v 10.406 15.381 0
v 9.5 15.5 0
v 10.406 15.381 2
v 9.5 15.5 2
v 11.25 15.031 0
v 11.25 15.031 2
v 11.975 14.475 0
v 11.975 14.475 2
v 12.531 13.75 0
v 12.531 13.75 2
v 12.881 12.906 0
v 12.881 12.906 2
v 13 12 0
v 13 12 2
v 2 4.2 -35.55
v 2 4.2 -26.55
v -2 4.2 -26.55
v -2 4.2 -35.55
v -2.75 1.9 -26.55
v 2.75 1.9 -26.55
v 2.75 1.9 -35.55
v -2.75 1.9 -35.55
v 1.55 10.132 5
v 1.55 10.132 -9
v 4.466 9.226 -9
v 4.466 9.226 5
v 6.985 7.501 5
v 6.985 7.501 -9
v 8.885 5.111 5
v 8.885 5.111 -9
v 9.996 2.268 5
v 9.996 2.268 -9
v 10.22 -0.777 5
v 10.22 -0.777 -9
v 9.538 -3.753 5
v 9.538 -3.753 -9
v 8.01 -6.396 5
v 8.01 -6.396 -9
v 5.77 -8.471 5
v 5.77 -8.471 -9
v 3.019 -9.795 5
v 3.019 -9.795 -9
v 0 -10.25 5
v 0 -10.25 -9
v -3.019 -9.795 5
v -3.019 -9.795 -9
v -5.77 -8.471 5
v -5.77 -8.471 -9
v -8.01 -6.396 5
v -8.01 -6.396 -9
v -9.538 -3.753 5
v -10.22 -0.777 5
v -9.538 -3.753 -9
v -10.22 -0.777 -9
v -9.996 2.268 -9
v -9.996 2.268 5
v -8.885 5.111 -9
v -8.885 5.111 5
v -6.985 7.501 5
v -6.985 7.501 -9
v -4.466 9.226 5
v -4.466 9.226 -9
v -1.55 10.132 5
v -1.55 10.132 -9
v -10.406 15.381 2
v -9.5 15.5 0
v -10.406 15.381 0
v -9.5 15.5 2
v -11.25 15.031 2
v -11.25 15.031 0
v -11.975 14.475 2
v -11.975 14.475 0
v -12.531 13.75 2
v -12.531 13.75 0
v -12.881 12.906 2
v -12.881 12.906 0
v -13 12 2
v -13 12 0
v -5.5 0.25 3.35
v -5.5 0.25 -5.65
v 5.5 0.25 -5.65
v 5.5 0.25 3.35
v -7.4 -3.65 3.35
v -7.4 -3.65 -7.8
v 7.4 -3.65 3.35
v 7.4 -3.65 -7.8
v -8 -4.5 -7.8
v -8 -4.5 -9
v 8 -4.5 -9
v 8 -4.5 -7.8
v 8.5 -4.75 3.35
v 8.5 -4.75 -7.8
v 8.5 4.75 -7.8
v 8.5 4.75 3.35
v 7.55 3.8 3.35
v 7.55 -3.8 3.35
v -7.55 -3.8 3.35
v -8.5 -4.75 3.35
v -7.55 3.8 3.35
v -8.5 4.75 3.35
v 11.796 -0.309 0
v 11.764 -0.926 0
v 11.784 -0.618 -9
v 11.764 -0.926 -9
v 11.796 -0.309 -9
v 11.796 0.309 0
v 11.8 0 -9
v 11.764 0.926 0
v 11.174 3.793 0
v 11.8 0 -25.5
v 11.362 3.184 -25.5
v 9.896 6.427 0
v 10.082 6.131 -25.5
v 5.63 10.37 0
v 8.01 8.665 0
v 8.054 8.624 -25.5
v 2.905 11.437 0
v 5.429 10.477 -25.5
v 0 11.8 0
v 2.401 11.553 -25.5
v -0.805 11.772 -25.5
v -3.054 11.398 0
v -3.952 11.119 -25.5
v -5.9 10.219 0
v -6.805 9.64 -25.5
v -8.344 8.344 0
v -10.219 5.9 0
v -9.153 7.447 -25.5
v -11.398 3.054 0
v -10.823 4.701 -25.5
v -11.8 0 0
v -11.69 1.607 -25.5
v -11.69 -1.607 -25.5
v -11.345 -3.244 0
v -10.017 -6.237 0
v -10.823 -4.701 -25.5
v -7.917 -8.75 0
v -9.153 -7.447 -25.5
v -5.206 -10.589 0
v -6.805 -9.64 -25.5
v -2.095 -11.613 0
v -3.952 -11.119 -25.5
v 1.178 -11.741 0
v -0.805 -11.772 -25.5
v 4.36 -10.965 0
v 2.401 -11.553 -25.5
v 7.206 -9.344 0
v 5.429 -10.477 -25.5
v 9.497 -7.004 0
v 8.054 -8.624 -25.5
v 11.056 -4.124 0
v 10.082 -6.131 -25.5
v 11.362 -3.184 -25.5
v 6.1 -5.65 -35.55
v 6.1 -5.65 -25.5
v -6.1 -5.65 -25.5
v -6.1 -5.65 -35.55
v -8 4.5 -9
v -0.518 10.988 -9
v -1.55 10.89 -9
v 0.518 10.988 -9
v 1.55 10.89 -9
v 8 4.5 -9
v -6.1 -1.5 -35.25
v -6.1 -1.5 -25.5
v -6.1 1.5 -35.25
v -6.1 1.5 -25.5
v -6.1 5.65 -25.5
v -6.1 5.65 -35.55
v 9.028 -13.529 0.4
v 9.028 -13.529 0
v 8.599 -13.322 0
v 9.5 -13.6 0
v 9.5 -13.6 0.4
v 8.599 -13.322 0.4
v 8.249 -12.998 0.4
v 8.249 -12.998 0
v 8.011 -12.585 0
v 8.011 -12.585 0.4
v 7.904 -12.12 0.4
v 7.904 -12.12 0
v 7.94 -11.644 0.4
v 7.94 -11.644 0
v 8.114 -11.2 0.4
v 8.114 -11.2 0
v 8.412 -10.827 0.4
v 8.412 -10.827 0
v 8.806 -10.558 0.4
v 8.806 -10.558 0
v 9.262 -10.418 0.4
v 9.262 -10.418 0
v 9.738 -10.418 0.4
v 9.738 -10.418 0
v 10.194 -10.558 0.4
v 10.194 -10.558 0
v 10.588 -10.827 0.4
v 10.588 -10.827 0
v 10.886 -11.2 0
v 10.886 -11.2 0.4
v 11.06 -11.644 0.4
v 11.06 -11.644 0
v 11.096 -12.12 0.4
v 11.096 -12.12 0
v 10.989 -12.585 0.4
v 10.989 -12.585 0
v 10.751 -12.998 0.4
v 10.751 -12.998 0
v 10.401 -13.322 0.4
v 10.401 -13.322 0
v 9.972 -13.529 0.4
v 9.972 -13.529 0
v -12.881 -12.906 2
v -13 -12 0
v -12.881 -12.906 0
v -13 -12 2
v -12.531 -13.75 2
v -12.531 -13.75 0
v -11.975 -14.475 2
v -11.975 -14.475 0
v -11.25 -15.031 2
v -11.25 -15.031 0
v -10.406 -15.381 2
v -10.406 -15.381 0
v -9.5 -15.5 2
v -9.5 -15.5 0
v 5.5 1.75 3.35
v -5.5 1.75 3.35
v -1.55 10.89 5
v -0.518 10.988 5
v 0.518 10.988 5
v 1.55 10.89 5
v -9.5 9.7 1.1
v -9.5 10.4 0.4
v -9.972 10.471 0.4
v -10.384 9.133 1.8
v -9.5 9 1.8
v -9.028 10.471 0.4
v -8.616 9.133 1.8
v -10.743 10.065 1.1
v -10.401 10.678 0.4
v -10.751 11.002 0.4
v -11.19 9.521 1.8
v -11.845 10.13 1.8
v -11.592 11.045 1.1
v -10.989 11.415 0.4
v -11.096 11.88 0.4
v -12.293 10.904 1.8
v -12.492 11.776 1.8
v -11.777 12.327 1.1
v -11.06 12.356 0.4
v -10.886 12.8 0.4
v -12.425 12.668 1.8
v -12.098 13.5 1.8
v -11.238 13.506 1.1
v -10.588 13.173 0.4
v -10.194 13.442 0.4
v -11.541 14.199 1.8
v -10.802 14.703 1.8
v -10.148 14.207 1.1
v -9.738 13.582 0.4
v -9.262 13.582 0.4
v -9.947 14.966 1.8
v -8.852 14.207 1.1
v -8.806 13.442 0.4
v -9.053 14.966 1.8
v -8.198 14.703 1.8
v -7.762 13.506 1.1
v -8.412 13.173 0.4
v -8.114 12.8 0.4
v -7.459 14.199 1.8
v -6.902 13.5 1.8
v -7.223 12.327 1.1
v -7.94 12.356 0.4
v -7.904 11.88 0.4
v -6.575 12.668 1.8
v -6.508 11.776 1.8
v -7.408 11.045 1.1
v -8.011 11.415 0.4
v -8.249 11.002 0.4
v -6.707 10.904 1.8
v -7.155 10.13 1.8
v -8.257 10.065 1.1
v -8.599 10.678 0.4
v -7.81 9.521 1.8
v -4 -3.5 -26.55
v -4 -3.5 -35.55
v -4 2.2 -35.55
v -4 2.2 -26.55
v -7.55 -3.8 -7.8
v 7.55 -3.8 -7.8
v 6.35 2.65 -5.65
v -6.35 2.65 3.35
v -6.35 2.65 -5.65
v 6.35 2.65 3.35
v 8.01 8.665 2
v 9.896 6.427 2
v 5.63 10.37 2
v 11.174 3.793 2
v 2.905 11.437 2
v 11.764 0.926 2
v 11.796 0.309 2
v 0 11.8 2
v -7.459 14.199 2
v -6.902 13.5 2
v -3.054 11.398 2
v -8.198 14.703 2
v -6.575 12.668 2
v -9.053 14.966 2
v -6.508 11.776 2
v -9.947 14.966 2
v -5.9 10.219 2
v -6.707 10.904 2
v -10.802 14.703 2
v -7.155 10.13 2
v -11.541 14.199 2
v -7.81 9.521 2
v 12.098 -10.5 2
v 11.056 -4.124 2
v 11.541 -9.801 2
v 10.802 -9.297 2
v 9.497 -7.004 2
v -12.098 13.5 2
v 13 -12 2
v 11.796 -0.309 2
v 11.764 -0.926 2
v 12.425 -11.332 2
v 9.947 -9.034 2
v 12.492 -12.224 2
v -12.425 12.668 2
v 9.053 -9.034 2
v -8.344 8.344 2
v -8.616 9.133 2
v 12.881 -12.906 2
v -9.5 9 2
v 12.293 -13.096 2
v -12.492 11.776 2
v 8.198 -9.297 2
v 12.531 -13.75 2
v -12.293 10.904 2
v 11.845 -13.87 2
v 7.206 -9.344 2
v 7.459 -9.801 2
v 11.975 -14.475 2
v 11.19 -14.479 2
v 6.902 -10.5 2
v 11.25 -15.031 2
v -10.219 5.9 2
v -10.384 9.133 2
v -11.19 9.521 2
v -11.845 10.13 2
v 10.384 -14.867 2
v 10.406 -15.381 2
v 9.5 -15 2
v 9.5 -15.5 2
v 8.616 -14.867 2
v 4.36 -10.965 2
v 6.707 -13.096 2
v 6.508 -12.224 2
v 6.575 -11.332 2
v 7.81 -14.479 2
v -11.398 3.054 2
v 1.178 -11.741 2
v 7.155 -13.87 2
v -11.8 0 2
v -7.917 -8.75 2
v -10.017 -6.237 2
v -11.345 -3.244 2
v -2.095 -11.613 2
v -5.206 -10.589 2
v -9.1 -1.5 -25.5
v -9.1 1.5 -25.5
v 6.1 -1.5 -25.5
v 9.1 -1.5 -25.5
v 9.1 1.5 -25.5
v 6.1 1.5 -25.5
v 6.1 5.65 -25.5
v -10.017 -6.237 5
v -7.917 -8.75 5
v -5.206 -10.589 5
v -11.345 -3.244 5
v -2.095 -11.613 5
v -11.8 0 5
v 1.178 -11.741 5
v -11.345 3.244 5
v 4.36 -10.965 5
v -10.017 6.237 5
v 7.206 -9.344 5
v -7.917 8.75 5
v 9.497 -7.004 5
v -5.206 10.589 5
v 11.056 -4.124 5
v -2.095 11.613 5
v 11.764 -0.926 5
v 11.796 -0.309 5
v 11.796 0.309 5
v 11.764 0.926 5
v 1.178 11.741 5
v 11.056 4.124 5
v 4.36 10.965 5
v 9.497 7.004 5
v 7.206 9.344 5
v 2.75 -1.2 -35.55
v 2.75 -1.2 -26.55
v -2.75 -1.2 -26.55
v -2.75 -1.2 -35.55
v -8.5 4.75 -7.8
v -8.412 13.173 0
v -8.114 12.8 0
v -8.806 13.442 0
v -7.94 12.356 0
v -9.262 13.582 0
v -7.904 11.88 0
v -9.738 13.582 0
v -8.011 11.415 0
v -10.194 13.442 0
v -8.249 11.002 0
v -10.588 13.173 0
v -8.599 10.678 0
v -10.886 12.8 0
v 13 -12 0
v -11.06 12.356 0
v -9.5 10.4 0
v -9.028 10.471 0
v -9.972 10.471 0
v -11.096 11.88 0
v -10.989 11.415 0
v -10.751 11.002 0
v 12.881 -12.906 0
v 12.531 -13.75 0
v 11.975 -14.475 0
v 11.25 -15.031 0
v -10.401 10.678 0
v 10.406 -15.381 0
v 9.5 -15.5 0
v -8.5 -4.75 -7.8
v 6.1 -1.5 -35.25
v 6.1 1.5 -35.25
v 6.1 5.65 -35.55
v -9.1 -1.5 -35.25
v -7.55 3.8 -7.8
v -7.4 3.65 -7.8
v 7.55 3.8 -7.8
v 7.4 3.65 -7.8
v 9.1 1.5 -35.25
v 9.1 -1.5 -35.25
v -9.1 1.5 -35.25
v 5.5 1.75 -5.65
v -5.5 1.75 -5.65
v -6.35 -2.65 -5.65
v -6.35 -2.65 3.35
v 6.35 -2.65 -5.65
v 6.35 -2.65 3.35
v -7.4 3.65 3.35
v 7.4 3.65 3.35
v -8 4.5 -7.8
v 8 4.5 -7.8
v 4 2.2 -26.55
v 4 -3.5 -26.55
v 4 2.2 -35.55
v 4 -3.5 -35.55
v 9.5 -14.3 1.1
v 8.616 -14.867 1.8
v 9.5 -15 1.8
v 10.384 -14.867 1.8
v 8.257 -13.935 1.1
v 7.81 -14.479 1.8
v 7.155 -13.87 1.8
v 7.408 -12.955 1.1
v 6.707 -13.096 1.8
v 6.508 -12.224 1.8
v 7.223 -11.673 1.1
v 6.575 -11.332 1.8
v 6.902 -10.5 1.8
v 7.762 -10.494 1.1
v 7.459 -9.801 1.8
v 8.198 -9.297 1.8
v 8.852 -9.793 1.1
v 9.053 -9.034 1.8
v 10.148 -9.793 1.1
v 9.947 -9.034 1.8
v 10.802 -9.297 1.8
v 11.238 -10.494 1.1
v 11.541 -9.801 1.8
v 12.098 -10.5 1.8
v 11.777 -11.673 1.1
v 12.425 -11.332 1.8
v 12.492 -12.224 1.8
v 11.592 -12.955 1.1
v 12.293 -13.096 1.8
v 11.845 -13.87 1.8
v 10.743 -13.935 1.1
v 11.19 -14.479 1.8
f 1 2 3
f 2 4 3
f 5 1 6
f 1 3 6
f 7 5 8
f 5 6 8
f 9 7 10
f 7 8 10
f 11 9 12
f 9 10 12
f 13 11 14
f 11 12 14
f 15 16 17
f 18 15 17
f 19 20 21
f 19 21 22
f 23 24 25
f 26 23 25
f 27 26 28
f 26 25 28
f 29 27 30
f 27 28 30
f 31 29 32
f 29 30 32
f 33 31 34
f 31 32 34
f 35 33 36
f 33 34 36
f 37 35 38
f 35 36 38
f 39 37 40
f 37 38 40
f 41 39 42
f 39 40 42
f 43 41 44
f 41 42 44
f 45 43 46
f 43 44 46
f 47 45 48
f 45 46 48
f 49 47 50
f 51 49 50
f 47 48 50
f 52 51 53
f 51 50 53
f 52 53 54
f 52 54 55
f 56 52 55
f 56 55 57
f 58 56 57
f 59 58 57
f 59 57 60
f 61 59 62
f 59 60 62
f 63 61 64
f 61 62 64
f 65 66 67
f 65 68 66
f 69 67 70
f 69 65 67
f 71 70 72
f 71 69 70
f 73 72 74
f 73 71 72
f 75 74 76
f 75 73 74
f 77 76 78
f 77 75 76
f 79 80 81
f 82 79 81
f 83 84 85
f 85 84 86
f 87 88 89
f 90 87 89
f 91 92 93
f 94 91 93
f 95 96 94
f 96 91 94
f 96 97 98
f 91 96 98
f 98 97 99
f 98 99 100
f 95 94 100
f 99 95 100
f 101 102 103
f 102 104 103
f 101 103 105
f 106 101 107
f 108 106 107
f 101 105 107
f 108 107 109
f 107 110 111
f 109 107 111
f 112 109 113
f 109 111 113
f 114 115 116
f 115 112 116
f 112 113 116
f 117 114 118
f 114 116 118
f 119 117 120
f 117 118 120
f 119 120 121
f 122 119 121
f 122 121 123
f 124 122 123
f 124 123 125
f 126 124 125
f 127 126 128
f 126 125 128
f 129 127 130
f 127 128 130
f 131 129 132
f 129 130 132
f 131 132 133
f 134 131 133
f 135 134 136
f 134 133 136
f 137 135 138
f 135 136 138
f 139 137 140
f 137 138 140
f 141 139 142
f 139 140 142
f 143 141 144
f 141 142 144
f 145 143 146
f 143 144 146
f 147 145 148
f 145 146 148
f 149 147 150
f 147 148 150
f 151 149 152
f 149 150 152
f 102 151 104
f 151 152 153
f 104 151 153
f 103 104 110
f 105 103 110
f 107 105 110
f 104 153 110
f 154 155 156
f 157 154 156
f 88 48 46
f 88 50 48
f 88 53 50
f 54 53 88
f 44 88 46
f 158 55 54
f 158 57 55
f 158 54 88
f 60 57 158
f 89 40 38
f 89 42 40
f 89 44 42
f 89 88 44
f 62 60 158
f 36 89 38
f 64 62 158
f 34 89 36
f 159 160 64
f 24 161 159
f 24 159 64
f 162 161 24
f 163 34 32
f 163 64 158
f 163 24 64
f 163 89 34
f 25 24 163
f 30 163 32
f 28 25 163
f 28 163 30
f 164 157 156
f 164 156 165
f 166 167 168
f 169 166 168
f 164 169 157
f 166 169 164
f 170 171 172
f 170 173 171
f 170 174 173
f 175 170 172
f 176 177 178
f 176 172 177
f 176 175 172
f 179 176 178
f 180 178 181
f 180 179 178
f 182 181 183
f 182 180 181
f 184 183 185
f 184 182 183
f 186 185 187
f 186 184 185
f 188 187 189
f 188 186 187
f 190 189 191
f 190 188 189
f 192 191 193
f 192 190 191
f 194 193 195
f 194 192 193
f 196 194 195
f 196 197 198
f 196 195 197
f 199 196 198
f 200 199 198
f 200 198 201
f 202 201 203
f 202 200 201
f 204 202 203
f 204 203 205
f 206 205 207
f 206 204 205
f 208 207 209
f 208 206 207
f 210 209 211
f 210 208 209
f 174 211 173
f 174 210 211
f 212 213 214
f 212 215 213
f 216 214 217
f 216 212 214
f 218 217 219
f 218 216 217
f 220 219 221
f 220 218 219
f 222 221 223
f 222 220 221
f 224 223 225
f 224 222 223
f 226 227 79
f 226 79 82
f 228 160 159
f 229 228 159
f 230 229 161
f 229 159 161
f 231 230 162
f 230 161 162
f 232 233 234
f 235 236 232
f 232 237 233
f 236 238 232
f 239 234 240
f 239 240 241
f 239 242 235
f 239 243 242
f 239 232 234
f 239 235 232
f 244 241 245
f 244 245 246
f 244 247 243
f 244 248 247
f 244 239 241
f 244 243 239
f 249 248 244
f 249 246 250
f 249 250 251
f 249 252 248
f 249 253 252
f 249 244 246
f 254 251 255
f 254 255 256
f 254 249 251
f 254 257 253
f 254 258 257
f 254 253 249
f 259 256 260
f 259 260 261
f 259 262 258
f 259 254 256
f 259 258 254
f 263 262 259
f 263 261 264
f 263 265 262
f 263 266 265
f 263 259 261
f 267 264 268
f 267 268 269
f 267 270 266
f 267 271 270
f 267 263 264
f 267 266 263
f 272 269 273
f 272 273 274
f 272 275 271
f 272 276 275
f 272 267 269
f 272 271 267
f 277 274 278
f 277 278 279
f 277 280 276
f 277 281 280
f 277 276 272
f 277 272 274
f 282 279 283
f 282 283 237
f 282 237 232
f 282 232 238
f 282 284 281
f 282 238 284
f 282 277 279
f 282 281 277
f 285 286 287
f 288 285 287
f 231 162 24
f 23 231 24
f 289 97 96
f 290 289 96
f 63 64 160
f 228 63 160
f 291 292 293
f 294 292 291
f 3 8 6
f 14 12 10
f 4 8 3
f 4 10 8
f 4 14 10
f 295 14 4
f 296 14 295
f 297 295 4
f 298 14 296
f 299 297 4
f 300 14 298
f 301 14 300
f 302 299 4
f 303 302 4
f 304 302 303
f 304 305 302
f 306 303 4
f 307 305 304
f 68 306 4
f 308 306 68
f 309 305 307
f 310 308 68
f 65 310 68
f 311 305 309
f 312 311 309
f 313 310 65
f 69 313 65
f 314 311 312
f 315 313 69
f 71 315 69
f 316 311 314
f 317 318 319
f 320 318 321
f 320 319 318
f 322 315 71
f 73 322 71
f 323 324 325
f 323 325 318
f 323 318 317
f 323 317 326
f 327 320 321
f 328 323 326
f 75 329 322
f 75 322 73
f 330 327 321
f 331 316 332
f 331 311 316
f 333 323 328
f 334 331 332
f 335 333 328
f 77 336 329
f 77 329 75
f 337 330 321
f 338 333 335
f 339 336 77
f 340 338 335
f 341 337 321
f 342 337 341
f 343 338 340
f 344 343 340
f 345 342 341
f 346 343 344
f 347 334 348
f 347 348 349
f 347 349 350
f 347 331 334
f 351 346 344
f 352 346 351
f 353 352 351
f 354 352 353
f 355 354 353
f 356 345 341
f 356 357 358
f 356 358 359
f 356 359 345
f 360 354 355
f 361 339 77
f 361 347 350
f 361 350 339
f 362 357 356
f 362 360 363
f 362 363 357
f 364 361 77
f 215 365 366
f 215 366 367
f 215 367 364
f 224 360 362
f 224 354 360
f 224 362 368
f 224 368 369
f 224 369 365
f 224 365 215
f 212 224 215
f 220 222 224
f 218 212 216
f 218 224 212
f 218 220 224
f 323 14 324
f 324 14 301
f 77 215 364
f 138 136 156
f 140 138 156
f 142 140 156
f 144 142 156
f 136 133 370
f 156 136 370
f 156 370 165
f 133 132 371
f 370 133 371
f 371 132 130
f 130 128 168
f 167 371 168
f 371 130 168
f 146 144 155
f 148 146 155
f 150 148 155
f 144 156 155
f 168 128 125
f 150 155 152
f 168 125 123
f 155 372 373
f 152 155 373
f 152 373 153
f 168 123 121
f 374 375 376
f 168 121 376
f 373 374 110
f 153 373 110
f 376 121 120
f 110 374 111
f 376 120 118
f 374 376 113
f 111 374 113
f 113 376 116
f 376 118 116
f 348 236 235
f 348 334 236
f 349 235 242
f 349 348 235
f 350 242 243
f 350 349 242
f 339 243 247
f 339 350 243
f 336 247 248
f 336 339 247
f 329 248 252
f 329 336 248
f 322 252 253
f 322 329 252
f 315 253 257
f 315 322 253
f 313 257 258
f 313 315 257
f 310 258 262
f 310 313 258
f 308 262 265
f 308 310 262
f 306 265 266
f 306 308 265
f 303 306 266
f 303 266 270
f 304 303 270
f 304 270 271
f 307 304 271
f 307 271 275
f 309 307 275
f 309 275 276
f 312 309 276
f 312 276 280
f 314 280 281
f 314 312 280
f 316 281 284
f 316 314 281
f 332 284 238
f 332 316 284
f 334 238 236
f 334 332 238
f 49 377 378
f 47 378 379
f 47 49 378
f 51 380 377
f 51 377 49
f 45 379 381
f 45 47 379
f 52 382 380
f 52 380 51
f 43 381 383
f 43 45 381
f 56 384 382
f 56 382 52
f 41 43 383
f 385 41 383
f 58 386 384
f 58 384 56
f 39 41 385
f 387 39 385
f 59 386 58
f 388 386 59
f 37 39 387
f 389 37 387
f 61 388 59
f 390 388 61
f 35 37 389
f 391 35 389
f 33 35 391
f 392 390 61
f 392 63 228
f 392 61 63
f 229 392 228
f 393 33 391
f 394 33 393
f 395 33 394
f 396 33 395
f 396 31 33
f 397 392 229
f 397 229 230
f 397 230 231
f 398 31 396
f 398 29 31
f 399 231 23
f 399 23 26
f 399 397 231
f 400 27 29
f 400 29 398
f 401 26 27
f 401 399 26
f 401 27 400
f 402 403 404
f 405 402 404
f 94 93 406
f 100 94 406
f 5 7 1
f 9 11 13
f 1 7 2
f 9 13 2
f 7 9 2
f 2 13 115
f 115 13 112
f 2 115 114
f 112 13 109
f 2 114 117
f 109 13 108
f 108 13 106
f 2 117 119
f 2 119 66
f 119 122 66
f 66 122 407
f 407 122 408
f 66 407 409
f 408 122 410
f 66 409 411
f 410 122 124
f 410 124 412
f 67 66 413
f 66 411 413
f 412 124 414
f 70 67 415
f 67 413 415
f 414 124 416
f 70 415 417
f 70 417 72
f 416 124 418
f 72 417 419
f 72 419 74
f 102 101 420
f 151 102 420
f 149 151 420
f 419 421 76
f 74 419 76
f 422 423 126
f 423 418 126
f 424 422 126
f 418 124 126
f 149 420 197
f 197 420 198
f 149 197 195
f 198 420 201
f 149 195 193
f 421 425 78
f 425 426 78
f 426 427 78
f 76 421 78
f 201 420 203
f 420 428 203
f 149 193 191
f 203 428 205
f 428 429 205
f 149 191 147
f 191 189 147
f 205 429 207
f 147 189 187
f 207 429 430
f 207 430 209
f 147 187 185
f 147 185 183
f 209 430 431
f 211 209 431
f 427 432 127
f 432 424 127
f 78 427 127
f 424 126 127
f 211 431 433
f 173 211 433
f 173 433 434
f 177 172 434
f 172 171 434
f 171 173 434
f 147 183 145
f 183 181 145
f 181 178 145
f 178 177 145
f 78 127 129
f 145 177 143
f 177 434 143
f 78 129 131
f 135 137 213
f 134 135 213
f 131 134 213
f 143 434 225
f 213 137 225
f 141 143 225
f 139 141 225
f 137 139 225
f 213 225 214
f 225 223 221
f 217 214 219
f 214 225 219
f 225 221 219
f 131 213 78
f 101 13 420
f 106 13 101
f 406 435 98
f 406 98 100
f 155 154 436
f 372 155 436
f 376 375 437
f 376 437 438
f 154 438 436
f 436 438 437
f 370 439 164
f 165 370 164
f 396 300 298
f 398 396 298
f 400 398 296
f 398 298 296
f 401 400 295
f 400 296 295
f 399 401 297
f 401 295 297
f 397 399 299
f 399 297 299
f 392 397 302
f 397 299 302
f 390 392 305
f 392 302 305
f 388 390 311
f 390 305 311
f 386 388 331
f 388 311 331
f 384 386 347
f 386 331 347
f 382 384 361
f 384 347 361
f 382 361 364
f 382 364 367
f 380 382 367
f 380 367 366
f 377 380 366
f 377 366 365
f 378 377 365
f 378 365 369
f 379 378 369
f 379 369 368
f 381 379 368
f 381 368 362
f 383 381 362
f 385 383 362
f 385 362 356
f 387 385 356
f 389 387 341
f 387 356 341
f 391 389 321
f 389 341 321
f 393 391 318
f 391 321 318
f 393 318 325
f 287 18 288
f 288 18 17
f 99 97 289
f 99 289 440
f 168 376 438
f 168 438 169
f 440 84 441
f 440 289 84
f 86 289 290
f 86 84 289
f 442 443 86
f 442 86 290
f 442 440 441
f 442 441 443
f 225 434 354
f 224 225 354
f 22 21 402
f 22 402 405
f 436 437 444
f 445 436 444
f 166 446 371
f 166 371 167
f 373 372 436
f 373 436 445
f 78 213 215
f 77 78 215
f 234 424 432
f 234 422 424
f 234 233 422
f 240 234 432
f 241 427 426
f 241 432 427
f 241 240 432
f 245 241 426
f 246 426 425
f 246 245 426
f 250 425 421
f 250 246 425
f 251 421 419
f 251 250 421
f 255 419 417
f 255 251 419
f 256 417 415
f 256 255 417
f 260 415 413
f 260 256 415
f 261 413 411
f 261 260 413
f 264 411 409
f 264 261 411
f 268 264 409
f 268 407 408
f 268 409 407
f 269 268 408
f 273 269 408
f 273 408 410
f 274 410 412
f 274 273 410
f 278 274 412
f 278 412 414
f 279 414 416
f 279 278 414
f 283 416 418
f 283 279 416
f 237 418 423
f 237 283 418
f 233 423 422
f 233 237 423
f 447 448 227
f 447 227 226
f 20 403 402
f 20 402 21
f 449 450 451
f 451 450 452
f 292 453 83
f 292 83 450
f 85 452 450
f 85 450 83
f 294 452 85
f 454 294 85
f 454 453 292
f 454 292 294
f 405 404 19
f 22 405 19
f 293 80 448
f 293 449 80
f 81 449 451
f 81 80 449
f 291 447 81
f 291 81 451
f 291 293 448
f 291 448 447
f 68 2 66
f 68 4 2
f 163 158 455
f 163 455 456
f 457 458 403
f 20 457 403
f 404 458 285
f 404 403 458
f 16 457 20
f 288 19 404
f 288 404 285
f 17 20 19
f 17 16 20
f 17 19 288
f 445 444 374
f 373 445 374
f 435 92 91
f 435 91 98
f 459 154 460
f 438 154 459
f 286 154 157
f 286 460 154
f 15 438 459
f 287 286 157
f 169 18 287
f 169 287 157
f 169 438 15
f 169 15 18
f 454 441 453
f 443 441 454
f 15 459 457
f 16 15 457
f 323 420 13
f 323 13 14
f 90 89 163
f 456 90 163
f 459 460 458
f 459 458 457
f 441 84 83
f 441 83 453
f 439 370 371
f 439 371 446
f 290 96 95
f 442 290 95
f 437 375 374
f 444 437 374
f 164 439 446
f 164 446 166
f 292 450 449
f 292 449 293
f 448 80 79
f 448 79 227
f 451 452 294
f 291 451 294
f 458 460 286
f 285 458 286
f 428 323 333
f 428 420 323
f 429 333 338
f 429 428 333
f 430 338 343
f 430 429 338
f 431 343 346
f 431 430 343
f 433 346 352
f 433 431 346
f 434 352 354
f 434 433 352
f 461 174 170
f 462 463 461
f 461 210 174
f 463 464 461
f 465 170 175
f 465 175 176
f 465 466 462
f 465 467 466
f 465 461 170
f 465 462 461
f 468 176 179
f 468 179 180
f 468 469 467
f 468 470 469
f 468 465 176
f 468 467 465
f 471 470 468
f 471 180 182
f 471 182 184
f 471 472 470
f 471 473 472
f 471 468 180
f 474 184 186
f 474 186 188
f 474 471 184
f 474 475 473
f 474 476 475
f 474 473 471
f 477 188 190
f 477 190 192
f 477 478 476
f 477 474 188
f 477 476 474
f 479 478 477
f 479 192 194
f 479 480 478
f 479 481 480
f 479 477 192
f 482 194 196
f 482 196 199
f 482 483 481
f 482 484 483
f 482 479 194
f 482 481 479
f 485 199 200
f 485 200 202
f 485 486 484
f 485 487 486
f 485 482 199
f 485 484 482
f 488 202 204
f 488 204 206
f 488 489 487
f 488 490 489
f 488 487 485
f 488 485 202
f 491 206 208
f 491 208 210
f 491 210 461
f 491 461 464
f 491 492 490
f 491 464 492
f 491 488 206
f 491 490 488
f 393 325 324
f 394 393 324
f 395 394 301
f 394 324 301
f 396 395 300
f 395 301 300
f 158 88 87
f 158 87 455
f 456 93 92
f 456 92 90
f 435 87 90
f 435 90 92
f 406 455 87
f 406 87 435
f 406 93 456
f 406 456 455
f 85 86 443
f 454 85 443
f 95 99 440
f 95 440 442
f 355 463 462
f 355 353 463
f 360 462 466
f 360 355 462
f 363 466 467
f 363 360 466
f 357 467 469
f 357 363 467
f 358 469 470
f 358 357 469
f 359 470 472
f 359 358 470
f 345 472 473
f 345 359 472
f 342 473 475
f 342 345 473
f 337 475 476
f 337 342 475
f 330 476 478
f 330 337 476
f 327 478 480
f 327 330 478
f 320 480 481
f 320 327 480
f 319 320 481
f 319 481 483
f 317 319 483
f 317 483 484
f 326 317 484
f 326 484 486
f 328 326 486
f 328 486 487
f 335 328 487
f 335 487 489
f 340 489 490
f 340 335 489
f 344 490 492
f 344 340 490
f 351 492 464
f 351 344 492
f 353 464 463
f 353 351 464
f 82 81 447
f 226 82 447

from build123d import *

# Parameters (mm, degrees)
BOSS_EXTRU_1_START                          = -25.5
BOSS_EXTRU_1_OUTLINE_R                      = 11.8
BOSS_EXTRU_1_DEPTH                          = 16.5
BOSS_EXTRU_1_START_2                        = -9
BOSS_EXTRU_1_2_DEPTH                        = 14
BOSS_EXTRU_1_3_DEPTH                        = 2
BOSS_EXTRU_1_4_OUTLINE_W                    = 16
BOSS_EXTRU_1_4_OUTLINE_H                    = 9
BOSS_EXTRU_1_4_DEPTH                        = 1.2
BOSS_EXTRU_1_START_3                        = -7.8
BOSS_EXTRU_1_5_DEPTH                        = 7.8
BOSS_EXTRU_1_START_4                        = 2
BOSS_EXTRU_1_6_DEPTH                        = 3
ESQUISSE2_W                                 = 17
ESQUISSE2_H                                 = 9.5
BOSS_EXTRU_2_DEPTH                          = 11.15
ESQUISSE3_W                                 = 2
ESQUISSE3_H                                 = 27.3
BOSS_EXTRU_3_DEPTH                          = 1.236375462
ESQUISSE4_W                                 = 2
ESQUISSE4_H                                 = 27.3
BOSS_EXTRU_4_DEPTH                          = 1.2
ESQUISSE5_W                                 = 26
ESQUISSE5_H                                 = 2
BOSS_EXTRU_5_DEPTH                          = 3.7
ESQUISSE6_W                                 = 15.1
ESQUISSE6_H                                 = 7.6
ENL_V_MAT_EXTRU_1_DEPTH                     = 11.15
ESQUISSE7_W                                 = 14.8
ESQUISSE7_H                                 = 7.3
BOSS_EXTRU_6_DEPTH                          = 11.15
ESQUISSE8_W                                 = 12.7
ESQUISSE8_H                                 = 5.3
ENL_V_MAT_EXTRU_2_DEPTH                     = 9
ESQUISSE9_W                                 = 11
ESQUISSE9_H                                 = 1.5
BOSS_EXTRU_7_DEPTH                          = 9
ESQUISSE10_W                                = 12.2
ESQUISSE10_H                                = 11.3
BOSS_EXTRU_8_DEPTH                          = 10.05
ESQUISSE11_W                                = 8
ESQUISSE11_H                                = 7.7
ENL_V_MAT_EXTRU_3_DEPTH                     = 9
ESQUISSE12_W                                = 5.5
ESQUISSE12_H                                = 3.1
BOSS_EXTRU_9_DEPTH                          = 9
FRAISAGE_POUR_VIS_T_TE_FRAIS_E_M31_AT_COUNT = 2
FRAISAGE_POUR_VIS_T_TE_FRAIS_E_M31_AT_PITCH = 30.61045573
NERVURE1_START                              = -1.5
NERVURE1_OUTLINE_W                          = 3
NERVURE1_OUTLINE_H                          = 9.75
NERVURE1_DEPTH                              = 3
NERVURE2_START                              = -1.5
NERVURE2_OUTLINE_W                          = 3
NERVURE2_OUTLINE_H                          = 9.75
NERVURE2_DEPTH                              = 3
CHANFREIN1_SIZE                             = 2
CONG_4_R                                    = 3.5


with BuildPart() as part:
    # Boss.-Extru.1: read off the stored shape, not the designer's step
    # Boss.-Extru.1 outline → Boss.-Extru.1 (new body)
    with BuildSketch(Plane.XY.offset(BOSS_EXTRU_1_START)):
        Circle(BOSS_EXTRU_1_OUTLINE_R)
    extrude(amount=BOSS_EXTRU_1_DEPTH)

    # Boss.-Extru.1 2 outline → Boss.-Extru.1 2 (add)
    with BuildSketch(Plane.XY.offset(BOSS_EXTRU_1_START_2)):
        with BuildLine():
            ThreePointArc((11.763624538, 0.92581733), (-11.8, 0), (11.763624538, -0.92581733))
            Line((11.763624538, -0.92581733), (11.763624538, 0.92581733))
        make_face()
        with BuildLine():
            Line((-1.55, 10.132127121), (-1.55, 10.890247931))
            ThreePointArc((-1.55, 10.890247931), (0, 11), (1.55, 10.890247931))
            Line((1.55, 10.890247931), (1.55, 10.132127121))
            ThreePointArc((1.55, 10.132127121), (0, -10.25), (-1.55, 10.132127121))
        make_face(mode=Mode.SUBTRACT)
    extrude(amount=BOSS_EXTRU_1_2_DEPTH)

    # Boss.-Extru.1 3 outline → Boss.-Extru.1 3 (add)
    with BuildSketch(Plane.XY):
        with BuildLine():
            Line((2.9e-08, 11.8), (-11.8, 11.8))
            Line((-11.8, 11.8), (-11.8, 0))
            ThreePointArc((-11.8, 0), (-8.343860008, 8.343860028), (2.9e-08, 11.8))
        make_face()
        with BuildLine():
            ThreePointArc((11.763624538, -0.92581733), (-0.463265826, -11.790902628), (-11.8, 0))
            Line((-11.8, 0), (-11.8, -15.5))
            Line((-11.8, -15.5), (11.763624538, -15.5))
            Line((11.763624538, -15.5), (11.763624538, -0.92581733))
        make_face()
        with BuildLine():
            Line((11.763624538, 11.8), (2.9e-08, 11.8))
            ThreePointArc((2.9e-08, 11.8), (8.009848808, 8.665005602), (11.763624538, 0.92581733))
            Line((11.763624538, 0.92581733), (11.763624538, 11.8))
        make_face()
    extrude(amount=BOSS_EXTRU_1_3_DEPTH)

    # Boss.-Extru.1 4 outline → Boss.-Extru.1 4 (add)
    with BuildSketch(Plane.XY.offset(BOSS_EXTRU_1_START_2)):
        with BuildLine():
            Line((11.763624538, 0.92581733), (11.763624538, -0.92581733))
            ThreePointArc((11.763624538, -0.92581733), (11.8, 0), (11.763624538, 0.92581733))
        make_face()
        Rectangle(BOSS_EXTRU_1_4_OUTLINE_W, BOSS_EXTRU_1_4_OUTLINE_H)
    extrude(amount=BOSS_EXTRU_1_4_DEPTH)

    # Boss.-Extru.1 5 outline → Boss.-Extru.1 5 (add)
    with BuildSketch(Plane.XY.offset(BOSS_EXTRU_1_START_3)):
        with BuildLine():
            Line((11.763624538, 0.92581733), (11.763624538, -0.92581733))
            ThreePointArc((11.763624538, -0.92581733), (11.8, 0), (11.763624538, 0.92581733))
        make_face()
    extrude(amount=BOSS_EXTRU_1_5_DEPTH)

    # Boss.-Extru.1 6 outline → Boss.-Extru.1 6 (add)
    with BuildSketch(Plane.XY.offset(BOSS_EXTRU_1_START_4)):
        with BuildLine():
            Line((11.763624538, 0.92581733), (11.763624538, -0.92581733))
            ThreePointArc((11.763624538, -0.92581733), (11.8, 0), (11.763624538, 0.92581733))
        make_face()
    extrude(amount=BOSS_EXTRU_1_6_DEPTH)

    # Esquisse2 → Boss.-Extru.2 (add)
    with BuildSketch(Plane(origin=(0, 0, -7.8), x_dir=(-1, 0, 0), z_dir=(0, 0, -1))):
        Rectangle(ESQUISSE2_W, ESQUISSE2_H)
    extrude(amount=-BOSS_EXTRU_2_DEPTH)

    # Esquisse3 → Boss.-Extru.3 (add)
    with BuildSketch(Plane(origin=(11.763624538, 0, 0), x_dir=(0, 0, -1), z_dir=(1, 0, 0))):
        with Locations((-1, -1.85)):
            Rectangle(ESQUISSE3_W, ESQUISSE3_H)
    extrude(amount=BOSS_EXTRU_3_DEPTH)

    # Esquisse4 → Boss.-Extru.4 (add)
    with BuildSketch(Plane.ZY.offset(11.8)):
        with Locations((1, -1.85)):
            Rectangle(ESQUISSE4_W, ESQUISSE4_H)
    extrude(amount=BOSS_EXTRU_4_DEPTH)

    # Esquisse5 → Boss.-Extru.5 (add)
    with BuildSketch(Plane(origin=(0, 11.8, 0), x_dir=(-1, 0, 0), z_dir=(0, 1, 0))):
        with Locations((0, 1)):
            Rectangle(ESQUISSE5_W, ESQUISSE5_H)
    extrude(amount=BOSS_EXTRU_5_DEPTH)

    # Esquisse6 → Enlèv. mat.-Extru.1 (cut)
    with BuildSketch(Plane.XY.offset(3.35)):
        Rectangle(ESQUISSE6_W, ESQUISSE6_H)
    extrude(amount=-ENL_V_MAT_EXTRU_1_DEPTH, mode=Mode.SUBTRACT)

    # Esquisse7 → Boss.-Extru.6 (add)
    with BuildSketch(Plane.XY.offset(-7.8)):
        Rectangle(ESQUISSE7_W, ESQUISSE7_H)
    extrude(amount=BOSS_EXTRU_6_DEPTH)

    # Esquisse8 → Enlèv. mat.-Extru.2 (cut)
    with BuildSketch(Plane.XY.offset(3.35)):
        Rectangle(ESQUISSE8_W, ESQUISSE8_H)
    extrude(amount=-ENL_V_MAT_EXTRU_2_DEPTH, mode=Mode.SUBTRACT)

    # Esquisse9 → Boss.-Extru.7 (add)
    with BuildSketch(Plane.XY.offset(-5.65)):
        with Locations((0, 1)):
            Rectangle(ESQUISSE9_W, ESQUISSE9_H)
    extrude(amount=BOSS_EXTRU_7_DEPTH)

    # Esquisse10 → Boss.-Extru.8 (add)
    with BuildSketch(Plane(origin=(0, 0, -25.5), x_dir=(-1, 0, 0), z_dir=(0, 0, -1))):
        Rectangle(ESQUISSE10_W, ESQUISSE10_H)
    extrude(amount=BOSS_EXTRU_8_DEPTH)

    # Esquisse11 → Enlèv. mat.-Extru.3 (cut)
    with BuildSketch(Plane(origin=(0, 0, -35.55), x_dir=(-1, 0, 0), z_dir=(0, 0, -1))):
        with Locations((0, 0.35)):
            Rectangle(ESQUISSE11_W, ESQUISSE11_H)
    extrude(amount=-ENL_V_MAT_EXTRU_3_DEPTH, mode=Mode.SUBTRACT)

    # Esquisse12 → Boss.-Extru.9 (add)
    with BuildSketch(Plane(origin=(0, 0, -26.55), x_dir=(-1, 0, 0), z_dir=(0, 0, -1))):
        with Locations((0, 0.35)):
            Rectangle(ESQUISSE12_W, ESQUISSE12_H)
    extrude(amount=BOSS_EXTRU_9_DEPTH)

    # Esquisse13 → Fraisage pour vis à tête fraisée M31 (revolve, cut)
    with BuildSketch(Plane(origin=(-9.5, 12, 2), x_dir=(0, -1, 0), z_dir=(1, 0, 0))):
        Polygon((0, 0), (0, 37.55), (1.6, 37.55), (1.6, 1.599995685), (3, 0.19999191), (3, 0), align=None)
    fraisage_pour_vis_t_te_frais_e_m31 = revolve(axis=Axis((-9.5, 12, 8.35), (0, 0, -1)), mode=Mode.SUBTRACT)

    # Fraisage pour vis à tête fraisée M31 at: Fraisage pour vis à tête fraisée M31 ×2
    with Locations(*[Vector(0.6207029443655612, -0.7840458244617614, 0) * (i * FRAISAGE_POUR_VIS_T_TE_FRAIS_E_M31_AT_PITCH) for i in range(1, FRAISAGE_POUR_VIS_T_TE_FRAIS_E_M31_AT_COUNT)]):
        add(fraisage_pour_vis_t_te_frais_e_m31, mode=Mode.SUBTRACT)

    # Nervure1: read off the stored shape, not the designer's step
    # Nervure1 outline → Nervure1 (add)
    with BuildSketch(Plane.XZ.offset(NERVURE1_START)):
        with Locations((7.6, -30.375)):
            Rectangle(NERVURE1_OUTLINE_W, NERVURE1_OUTLINE_H)
    extrude(amount=NERVURE1_DEPTH)

    # Nervure2: read off the stored shape, not the designer's step
    # Nervure2 outline → Nervure2 (add)
    with BuildSketch(Plane(origin=(0, 0, 0), x_dir=(1, 0, 0), z_dir=(0, 1, 0)).offset(NERVURE2_START)):
        with Locations((-7.6, 30.375)):
            Rectangle(NERVURE2_OUTLINE_W, NERVURE2_OUTLINE_H)
    extrude(amount=NERVURE2_DEPTH)

    # Chanfrein1
    chanfrein1_edges = [part.edges().sort_by_distance(p)[0] for p in [
        (-4, 4.2, -31.05),
        (4, 4.2, -31.05),
    ]]
    chamfer(chanfrein1_edges, length=CHANFREIN1_SIZE)

    # Congé4
    cong_4_edges = [part.edges().sort_by_distance(p)[0] for p in [
        (13, -15.5, 1),
        (-13, -15.5, 1),
        (13, 15.5, 1),
        (-13, 15.5, 1),
    ]]
    fillet(cong_4_edges, radius=CONG_4_R)


solid = part.part
